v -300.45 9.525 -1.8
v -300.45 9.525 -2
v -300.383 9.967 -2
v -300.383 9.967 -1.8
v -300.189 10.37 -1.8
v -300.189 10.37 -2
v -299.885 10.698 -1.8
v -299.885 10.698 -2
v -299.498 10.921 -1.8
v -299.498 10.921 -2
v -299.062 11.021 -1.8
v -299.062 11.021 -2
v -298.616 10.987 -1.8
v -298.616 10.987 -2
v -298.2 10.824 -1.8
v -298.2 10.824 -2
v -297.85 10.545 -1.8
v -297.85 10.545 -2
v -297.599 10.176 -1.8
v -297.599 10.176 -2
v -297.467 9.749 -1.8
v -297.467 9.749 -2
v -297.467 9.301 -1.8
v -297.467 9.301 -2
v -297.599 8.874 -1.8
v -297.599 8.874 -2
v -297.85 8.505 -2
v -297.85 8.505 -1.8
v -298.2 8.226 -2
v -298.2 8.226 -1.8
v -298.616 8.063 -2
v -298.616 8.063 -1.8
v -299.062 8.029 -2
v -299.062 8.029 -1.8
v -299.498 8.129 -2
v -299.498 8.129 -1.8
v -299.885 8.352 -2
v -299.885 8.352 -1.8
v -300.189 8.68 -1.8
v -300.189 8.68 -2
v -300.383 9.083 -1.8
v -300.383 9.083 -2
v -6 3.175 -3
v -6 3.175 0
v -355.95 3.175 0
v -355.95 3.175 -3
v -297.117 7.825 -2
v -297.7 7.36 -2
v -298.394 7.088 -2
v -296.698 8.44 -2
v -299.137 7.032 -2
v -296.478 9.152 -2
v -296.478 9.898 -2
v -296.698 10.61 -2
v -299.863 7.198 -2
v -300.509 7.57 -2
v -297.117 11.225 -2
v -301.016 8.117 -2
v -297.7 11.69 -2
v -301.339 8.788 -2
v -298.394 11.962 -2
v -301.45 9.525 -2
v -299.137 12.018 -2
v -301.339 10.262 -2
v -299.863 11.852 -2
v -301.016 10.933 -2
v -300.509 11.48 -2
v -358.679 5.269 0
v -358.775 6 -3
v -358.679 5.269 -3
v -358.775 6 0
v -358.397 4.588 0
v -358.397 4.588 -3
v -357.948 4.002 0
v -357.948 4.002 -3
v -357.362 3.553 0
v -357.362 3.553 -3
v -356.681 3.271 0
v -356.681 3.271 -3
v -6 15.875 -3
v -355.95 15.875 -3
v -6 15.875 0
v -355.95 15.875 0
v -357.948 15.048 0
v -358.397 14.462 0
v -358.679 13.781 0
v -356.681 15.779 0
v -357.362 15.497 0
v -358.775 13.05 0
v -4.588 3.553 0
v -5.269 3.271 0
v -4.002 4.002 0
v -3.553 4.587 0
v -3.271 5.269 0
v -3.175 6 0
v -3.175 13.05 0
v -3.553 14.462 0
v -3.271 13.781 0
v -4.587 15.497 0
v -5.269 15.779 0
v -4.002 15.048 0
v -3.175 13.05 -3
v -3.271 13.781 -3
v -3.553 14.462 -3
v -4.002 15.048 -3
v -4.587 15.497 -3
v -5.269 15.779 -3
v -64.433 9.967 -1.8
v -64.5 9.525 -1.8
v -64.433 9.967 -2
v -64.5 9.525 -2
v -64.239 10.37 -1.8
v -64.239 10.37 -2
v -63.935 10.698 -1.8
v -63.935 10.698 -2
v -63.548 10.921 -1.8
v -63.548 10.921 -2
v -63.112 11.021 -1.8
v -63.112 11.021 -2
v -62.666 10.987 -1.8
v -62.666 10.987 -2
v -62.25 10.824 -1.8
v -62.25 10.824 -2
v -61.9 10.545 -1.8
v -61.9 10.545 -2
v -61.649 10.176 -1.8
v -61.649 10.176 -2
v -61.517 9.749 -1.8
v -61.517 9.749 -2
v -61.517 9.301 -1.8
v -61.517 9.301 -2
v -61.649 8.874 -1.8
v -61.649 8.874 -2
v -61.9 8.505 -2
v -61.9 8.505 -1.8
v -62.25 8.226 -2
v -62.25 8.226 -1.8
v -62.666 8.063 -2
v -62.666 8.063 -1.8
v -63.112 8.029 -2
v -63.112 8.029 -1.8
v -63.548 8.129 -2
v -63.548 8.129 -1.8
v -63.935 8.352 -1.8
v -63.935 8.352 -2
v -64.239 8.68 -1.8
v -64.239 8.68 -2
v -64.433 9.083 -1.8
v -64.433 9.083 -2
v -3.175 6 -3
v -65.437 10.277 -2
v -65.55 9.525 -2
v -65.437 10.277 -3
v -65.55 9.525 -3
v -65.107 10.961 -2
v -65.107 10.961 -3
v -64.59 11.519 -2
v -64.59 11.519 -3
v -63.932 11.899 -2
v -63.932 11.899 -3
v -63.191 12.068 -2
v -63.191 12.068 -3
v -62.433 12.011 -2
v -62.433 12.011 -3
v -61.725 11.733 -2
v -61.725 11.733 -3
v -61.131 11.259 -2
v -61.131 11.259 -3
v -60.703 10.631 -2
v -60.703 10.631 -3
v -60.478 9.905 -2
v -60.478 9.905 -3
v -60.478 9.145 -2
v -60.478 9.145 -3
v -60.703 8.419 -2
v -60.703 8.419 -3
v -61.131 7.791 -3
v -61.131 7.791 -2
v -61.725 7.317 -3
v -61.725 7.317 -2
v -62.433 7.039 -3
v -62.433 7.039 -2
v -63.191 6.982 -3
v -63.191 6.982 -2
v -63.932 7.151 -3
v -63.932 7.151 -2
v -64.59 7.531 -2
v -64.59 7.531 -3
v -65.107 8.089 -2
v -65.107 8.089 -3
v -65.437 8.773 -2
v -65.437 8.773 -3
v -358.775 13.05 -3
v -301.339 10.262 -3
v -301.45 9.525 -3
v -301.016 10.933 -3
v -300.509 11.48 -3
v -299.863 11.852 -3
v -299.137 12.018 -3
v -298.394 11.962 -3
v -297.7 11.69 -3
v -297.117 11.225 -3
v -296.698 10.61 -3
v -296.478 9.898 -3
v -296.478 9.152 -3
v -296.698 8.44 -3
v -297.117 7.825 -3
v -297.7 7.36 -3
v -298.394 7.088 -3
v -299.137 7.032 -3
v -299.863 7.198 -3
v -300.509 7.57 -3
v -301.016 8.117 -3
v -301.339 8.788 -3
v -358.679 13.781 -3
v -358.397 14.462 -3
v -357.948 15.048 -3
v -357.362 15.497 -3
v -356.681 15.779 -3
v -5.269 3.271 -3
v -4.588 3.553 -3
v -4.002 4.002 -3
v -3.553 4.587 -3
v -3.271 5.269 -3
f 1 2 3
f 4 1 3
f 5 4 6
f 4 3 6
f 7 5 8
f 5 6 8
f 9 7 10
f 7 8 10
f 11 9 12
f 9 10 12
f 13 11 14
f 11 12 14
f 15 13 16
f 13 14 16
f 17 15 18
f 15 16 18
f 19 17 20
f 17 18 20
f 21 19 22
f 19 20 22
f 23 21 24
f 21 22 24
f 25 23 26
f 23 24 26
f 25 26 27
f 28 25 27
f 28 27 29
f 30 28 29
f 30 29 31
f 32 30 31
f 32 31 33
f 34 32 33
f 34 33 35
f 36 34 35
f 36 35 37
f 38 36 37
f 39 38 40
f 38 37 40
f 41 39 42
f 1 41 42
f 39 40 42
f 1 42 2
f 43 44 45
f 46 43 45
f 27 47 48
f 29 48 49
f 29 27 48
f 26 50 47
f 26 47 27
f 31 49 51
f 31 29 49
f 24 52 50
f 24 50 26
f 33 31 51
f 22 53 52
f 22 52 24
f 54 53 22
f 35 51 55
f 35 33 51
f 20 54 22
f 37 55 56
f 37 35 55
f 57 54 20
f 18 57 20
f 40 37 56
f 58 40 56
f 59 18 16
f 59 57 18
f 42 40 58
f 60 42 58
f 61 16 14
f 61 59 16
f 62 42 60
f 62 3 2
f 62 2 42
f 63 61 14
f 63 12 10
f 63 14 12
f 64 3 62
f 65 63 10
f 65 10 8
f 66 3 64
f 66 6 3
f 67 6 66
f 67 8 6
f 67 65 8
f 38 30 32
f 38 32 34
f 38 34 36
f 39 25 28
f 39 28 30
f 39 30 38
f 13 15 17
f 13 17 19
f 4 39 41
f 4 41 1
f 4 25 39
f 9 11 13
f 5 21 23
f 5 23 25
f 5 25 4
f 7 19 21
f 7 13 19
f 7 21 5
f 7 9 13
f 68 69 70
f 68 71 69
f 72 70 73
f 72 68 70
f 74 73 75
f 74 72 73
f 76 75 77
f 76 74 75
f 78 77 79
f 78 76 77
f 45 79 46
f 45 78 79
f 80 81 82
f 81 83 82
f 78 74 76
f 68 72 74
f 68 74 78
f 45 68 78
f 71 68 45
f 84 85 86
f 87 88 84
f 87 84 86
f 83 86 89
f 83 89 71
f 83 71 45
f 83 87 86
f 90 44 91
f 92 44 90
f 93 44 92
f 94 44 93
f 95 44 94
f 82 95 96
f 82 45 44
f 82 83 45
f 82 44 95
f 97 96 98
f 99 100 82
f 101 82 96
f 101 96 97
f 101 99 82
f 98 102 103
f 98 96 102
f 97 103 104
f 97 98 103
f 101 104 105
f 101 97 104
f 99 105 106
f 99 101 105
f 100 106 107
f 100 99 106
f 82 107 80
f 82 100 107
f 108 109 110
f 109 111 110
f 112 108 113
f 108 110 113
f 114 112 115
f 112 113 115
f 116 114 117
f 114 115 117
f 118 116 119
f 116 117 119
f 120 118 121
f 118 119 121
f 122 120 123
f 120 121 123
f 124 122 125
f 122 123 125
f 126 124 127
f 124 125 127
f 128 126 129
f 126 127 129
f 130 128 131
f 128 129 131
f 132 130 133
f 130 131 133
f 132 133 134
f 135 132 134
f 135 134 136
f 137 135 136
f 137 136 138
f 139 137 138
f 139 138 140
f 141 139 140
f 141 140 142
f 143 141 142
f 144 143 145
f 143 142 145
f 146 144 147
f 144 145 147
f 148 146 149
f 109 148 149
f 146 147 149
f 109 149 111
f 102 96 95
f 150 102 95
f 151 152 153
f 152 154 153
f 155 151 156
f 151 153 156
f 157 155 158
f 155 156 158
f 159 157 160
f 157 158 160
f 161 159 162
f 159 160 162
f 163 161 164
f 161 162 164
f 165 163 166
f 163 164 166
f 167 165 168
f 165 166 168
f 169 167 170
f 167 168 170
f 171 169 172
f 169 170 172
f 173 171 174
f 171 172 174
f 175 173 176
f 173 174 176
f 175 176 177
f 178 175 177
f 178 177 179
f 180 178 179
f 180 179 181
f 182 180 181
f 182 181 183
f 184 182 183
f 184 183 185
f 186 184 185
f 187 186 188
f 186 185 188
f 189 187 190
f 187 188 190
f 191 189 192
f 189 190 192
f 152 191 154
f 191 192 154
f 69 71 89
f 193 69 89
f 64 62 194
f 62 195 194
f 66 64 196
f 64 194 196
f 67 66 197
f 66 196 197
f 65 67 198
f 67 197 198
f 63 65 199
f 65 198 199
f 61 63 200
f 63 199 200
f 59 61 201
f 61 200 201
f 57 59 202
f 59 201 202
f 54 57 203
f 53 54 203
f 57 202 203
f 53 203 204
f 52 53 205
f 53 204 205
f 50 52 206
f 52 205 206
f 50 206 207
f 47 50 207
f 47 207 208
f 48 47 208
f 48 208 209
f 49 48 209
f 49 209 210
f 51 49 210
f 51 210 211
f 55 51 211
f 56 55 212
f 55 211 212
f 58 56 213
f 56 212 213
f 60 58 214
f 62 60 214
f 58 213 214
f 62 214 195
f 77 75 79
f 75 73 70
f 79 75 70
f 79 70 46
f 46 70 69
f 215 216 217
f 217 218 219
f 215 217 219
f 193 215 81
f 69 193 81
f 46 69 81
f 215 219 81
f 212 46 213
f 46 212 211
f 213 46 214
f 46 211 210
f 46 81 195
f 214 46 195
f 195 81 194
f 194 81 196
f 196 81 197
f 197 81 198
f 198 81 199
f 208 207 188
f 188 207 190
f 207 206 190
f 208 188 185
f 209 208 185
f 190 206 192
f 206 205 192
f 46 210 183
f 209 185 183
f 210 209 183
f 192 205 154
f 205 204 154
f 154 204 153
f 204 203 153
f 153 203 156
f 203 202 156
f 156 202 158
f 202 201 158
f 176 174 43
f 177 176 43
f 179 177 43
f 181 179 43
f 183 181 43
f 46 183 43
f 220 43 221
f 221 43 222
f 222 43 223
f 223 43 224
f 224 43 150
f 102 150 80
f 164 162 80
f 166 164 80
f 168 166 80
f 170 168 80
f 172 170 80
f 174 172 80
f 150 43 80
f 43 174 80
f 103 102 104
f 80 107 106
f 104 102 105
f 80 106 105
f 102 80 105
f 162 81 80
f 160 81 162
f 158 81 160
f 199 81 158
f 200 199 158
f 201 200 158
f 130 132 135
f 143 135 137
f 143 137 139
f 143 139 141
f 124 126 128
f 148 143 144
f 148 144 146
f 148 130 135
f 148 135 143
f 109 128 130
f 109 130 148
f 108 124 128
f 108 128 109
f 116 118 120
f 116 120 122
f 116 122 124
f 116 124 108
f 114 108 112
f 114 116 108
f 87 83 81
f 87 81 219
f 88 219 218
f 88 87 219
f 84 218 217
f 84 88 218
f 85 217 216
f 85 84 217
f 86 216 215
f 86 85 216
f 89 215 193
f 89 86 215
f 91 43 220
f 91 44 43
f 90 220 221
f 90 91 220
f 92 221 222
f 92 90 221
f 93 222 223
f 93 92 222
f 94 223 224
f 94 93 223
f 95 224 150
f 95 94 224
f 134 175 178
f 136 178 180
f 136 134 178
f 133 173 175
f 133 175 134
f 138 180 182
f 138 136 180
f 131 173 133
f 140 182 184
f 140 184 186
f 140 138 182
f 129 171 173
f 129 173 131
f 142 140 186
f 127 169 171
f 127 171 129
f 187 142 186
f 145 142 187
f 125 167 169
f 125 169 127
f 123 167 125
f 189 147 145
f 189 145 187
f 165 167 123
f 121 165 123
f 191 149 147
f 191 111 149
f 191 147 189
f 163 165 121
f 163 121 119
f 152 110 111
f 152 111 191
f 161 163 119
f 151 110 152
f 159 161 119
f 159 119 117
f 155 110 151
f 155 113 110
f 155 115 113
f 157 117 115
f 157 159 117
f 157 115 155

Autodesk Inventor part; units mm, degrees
ref_plane "YZ Plane" through (0, 0, 0) normal (1, 0, 0) x (0, 1, 0)
ref_plane "XZ Plane" through (0, 0, 0) normal (0, 1, 0) x (-1, 0, 0)
ref_plane "XY Plane" through (0, 0, 0) normal (0, 0, 1) x (1, 0, 0)
sketch "Sketch1" plane through (0, 0, 0) normal (0, 0, 1) x (1, 0, 0)
  line L0 (-381.35, 16.05) -> (-6, 16.05)
  line L1 (-3, 13.05) -> (-3, 6)
  line L2 (-6, 3) -> (-381.35, 3)
  line L3 (-384.35, 6) -> (-384.35, 13.05)
  arc A0 (-3, 13.05) -> (-6, 16.05) centre (-6, 13.05) ccw
  arc A1 (-6, 3) -> (-3, 6) centre (-6, 6) ccw
  arc A2 (-381.35, 16.05) -> (-384.35, 13.05) centre (-381.35, 13.05) ccw
  arc A3 (-384.35, 6) -> (-381.35, 3) centre (-381.35, 6) ccw
  line L4 (-41.8897, 11.0236) -> (-317.4797, 11.0236)
  line L5 (-317.4797, 7.9756) -> (-41.8897, 7.9756)
  line L6 (-368.2797, 11.0236) -> (-368.2797, 7.9756)
  arc A4 (-368.2797, 11.0236) -> (-368.2797, 7.9756) centre (-368.2797, 9.4996) ccw
  line L7 (-86.8832, 11.0236) -> (-99.5832, 11.0236)
  line L8 (-41.8897, 11.0236) -> (-41.8897, 7.9756)
  arc A5 (-41.8897, 7.9756) -> (-41.8897, 11.0236) centre (-41.8897, 9.4996) ccw
  line L9 (-36.3424, 11.0744) -> (-6.7422, 11.0744) construction
  line L10 (-6.7422, 11.0744) -> (-6.7422, 8.0311) construction
  line L11 (-6.7422, 8.0311) -> (-36.3424, 8.0311) construction
  line L12 (-36.3424, 8.0311) -> (-36.3424, 11.0744) construction
  line L13 (-317.4797, 11.0236) -> (-368.2797, 11.0236)
  line L14 (-317.4797, 7.9756) -> (-368.2797, 7.9756)
  line L15 (-193.675, 9.525) -> (-193.675, 10.1012)
  line L16 (-193.675, 9.525) -> (-193.6526, 8.8818)
  line L17 (-35.1521, 9.2905) -> (-35.4935, 8.9245)
  line L18 (-35.4935, 8.9245) -> (-35.4935, 7.9833)
  line L19 (-35.4935, 7.9833) -> (-36.0379, 7.9833)
  line L20 (-36.0379, 7.9833) -> (-36.0379, 11.0313)
  line L21 (-36.0379, 11.0313) -> (-35.4935, 11.0313)
  line L22 (-35.4935, 11.0313) -> (-35.4935, 9.6073)
  line L23 (-35.4935, 9.6073) -> (-35.2013, 9.9733)
  line L24 (-35.2013, 9.9733) -> (-34.3278, 11.0313)
  line L25 (-34.3278, 11.0313) -> (-33.6665, 11.0313)
  line L26 (-33.6665, 11.0313) -> (-34.7922, 9.6842)
  line L27 (-34.7922, 9.6842) -> (-33.6081, 7.9833)
  line L28 (-33.6081, 7.9833) -> (-34.254, 7.9833)
  line L29 (-34.254, 7.9833) -> (-35.1521, 9.2905)
  spline S0 degree 2 poles (-31.6581, 9.5704) (-31.4028, 9.5027) (-31.1445, 9.1244) (-31.1445, 8.8753) knots 0 0 0 1 2 2 2
  spline S1 degree 2 poles (-31.1445, 8.8753) (-31.1445, 8.4416) (-31.7012, 7.9833) (-32.2056, 7.9833) knots 0 0 0 1 2 2 2
  line L30 (-32.2056, 7.9833) -> (-33.1252, 7.9833)
  line L31 (-33.1252, 7.9833) -> (-33.3313, 7.9833)
  line L32 (-33.3313, 7.9833) -> (-33.3313, 11.0313)
  line L33 (-33.3313, 11.0313) -> (-32.2825, 11.0313)
  spline S2 degree 2 poles (-32.2825, 11.0313) (-31.7688, 11.0313) (-31.2152, 10.6223) (-31.2152, 10.2071) knots 0 0 0 1 2 2 2
  spline S3 degree 2 poles (-31.2152, 10.2071) (-31.2152, 9.9918) (-31.4428, 9.6596) (-31.6581, 9.5704) knots 0 0 0 1 2 2 2
  spline S4 degree 2 poles (-32.2056, 8.4201) (-31.9534, 8.4201) (-31.6858, 8.6692) (-31.6858, 8.8753) knots 0 0 0 1 2 2 2
  spline S5 degree 2 poles (-31.6858, 8.8753) (-31.6858, 9.352) (-32.184, 9.352) knots 0 0 0 1 1 1
  line L34 (-32.184, 9.352) -> (-32.7869, 9.352)
  line L35 (-32.7869, 9.352) -> (-32.7869, 8.4201)
  line L36 (-32.7869, 8.4201) -> (-32.2056, 8.4201)
  line L37 (-32.7869, 10.5946) -> (-32.7869, 9.7488)
  line L38 (-32.7869, 9.7488) -> (-32.2794, 9.7488)
  spline S6 degree 2 poles (-32.2794, 9.7488) (-32.0303, 9.7488) (-31.7565, 9.9733) (-31.7565, 10.1732) knots 0 0 0 1 2 2 2
  spline S7 degree 2 poles (-31.7565, 10.1732) (-31.7565, 10.3947) (-32.0118, 10.5946) (-32.2825, 10.5946) knots 0 0 0 1 2 2 2
  line L39 (-32.2825, 10.5946) -> (-32.7869, 10.5946)
  spline S8 degree 2 poles (-29.7143, 11.0313) (-29.3083, 11.0313) (-28.6839, 10.6715) (-28.3364, 10.0133) (-28.3364, 9.5796) knots 0 0 0 1 2 3 3 3
  line L40 (-28.3364, 9.5796) -> (-28.3364, 9.432)
  spline S9 degree 2 poles (-28.3364, 9.432) (-28.3364, 8.9952) (-28.6839, 8.3401) (-29.3144, 7.9833) (-29.7327, 7.9833) knots 0 0 0 1 2 3 3 3
  line L41 (-29.7327, 7.9833) -> (-30.3786, 7.9833)
  line L42 (-30.3786, 7.9833) -> (-30.6185, 7.9833)
  line L43 (-30.6185, 7.9833) -> (-30.6185, 11.0313)
  line L44 (-30.6185, 11.0313) -> (-30.0741, 11.0313)
  line L45 (-30.0741, 11.0313) -> (-29.7143, 11.0313)
  spline S10 degree 2 poles (-28.8808, 9.5858) (-28.8808, 10.0748) (-29.3083, 10.5946) (-29.7143, 10.5946) knots 0 0 0 1 2 2 2
  line L46 (-29.7143, 10.5946) -> (-30.0741, 10.5946)
  line L47 (-30.0741, 10.5946) -> (-30.0741, 8.4201)
  line L48 (-30.0741, 8.4201) -> (-29.7327, 8.4201)
  spline S11 degree 2 poles (-29.7327, 8.4201) (-29.3144, 8.4201) (-28.8808, 8.9491) (-28.8808, 9.432) knots 0 0 0 1 2 2 2
  line L49 (-28.8808, 9.432) -> (-28.8808, 9.5858)
  line L50 (-26.8293, 7.9833) -> (-26.8293, 8.3432)
  line L51 (-26.8293, 8.3432) -> (-25.8389, 9.4197)
  spline S12 degree 2 poles (-25.8389, 9.4197) (-25.6759, 9.6011) (-25.4914, 9.8626) (-25.4145, 10.0717) (-25.4145, 10.1763) knots 0 0 0 1 2 3 3 3
  spline S13 degree 2 poles (-25.4145, 10.1763) (-25.4145, 10.3916) (-25.6513, 10.6561) (-25.8604, 10.6561) knots 0 0 0 1 2 2 2
  spline S14 degree 2 poles (-25.8604, 10.6561) (-26.1065, 10.6561) (-26.3679, 10.3516) (-26.3679, 10.0994) knots 0 0 0 1 2 2 2
  line L52 (-26.3679, 10.0994) -> (-26.8908, 10.0994)
  spline S15 degree 2 poles (-26.8908, 10.0994) (-26.8908, 10.3701) (-26.6417, 10.813) (-26.1742, 11.0744) (-25.8543, 11.0744) knots 0 0 0 1 2 3 3 3
  spline S16 degree 2 poles (-25.8543, 11.0744) (-25.5498, 11.0744) (-25.1192, 10.8683) (-24.8916, 10.49) (-24.8916, 10.2317) knots 0 0 0 1 2 3 3 3
  spline S17 degree 2 poles (-24.8916, 10.2317) (-24.8916, 9.9641) (-25.2115, 9.4289) (-25.516, 9.109) knots 0 0 0 1 2 2 2
  line L53 (-25.516, 9.109) -> (-26.1772, 8.4016)
  line L54 (-26.1772, 8.4016) -> (-24.7747, 8.4016)
  line L55 (-24.7747, 8.4016) -> (-24.7747, 7.9833)
  line L56 (-24.7747, 7.9833) -> (-26.8293, 7.9833)
  spline S18 degree 2 poles (-23.2184, 10.0071) (-22.9324, 10.0071) (-22.5387, 9.7242) (-22.348, 9.2597) (-22.348, 8.9829) knots 0 0 0 1 2 3 3 3
  spline S19 degree 2 poles (-22.348, 8.9829) (-22.348, 8.6877) (-22.5848, 8.214) (-23.037, 7.9403) (-23.3415, 7.9403) knots 0 0 0 1 2 3 3 3
  spline S20 degree 2 poles (-23.3415, 7.9403) (-23.6613, 7.9403) (-24.1288, 8.2663) (-24.3749, 8.8138) (-24.3749, 9.1398) knots 0 0 0 1 2 3 3 3
  line L57 (-24.3749, 9.1398) -> (-24.3749, 9.3428)
  spline S21 degree 2 poles (-24.3749, 9.3428) (-24.3749, 9.8226) (-24.0612, 10.5915) (-23.3814, 11.0498) (-22.8617, 11.0498) knots 0 0 0 1 2 3 3 3
  line L58 (-22.8617, 11.0498) -> (-22.7971, 11.0498)
  line L59 (-22.7971, 11.0498) -> (-22.7971, 10.6192)
  line L60 (-22.7971, 10.6192) -> (-22.834, 10.6192)
  spline S22 degree 2 poles (-22.834, 10.6192) (-23.1477, 10.6192) (-23.5783, 10.3916) (-23.812, 10.0071) (-23.8397, 9.7519) knots 0 0 0 1 2 3 3 3
  spline S23 degree 2 poles (-23.8397, 9.7519) (-23.7259, 9.8749) (-23.4061, 10.0071) (-23.2184, 10.0071) knots 0 0 0 1 2 2 2
  spline S24 degree 2 poles (-23.3476, 8.3616) (-23.2, 8.3616) (-22.9816, 8.5185) (-22.8647, 8.7922) (-22.8647, 8.9706) knots 0 0 0 1 2 3 3 3
  spline S25 degree 2 poles (-22.8647, 8.9706) (-22.8647, 9.1429) (-22.9785, 9.4228) (-23.1969, 9.5858) (-23.3507, 9.5858) knots 0 0 0 1 2 3 3 3
  spline S26 degree 2 poles (-23.3507, 9.5858) (-23.5199, 9.5858) (-23.7905, 9.3951) (-23.852, 9.2505) knots 0 0 0 1 2 2 2
  line L61 (-23.852, 9.2505) -> (-23.852, 9.0906)
  spline S27 degree 2 poles (-23.852, 9.0906) (-23.852, 8.8599) (-23.7167, 8.5308) (-23.4891, 8.3616) (-23.3476, 8.3616) knots 0 0 0 1 2 3 3 3
  spline S28 degree 2 poles (-19.9521, 9.2659) (-19.9521, 7.9403) (-20.9486, 7.9403) knots 0 0 0 1 1 1
  spline S29 degree 2 poles (-20.9486, 7.9403) (-21.4253, 7.9403) (-21.9543, 8.5739) (-21.9543, 9.2659) knots 0 0 0 1 2 2 2
  line L62 (-21.9543, 9.2659) -> (-21.9543, 9.7642)
  spline S30 degree 2 poles (-21.9543, 9.7642) (-21.9543, 10.4531) (-21.4315, 11.0744) (-20.9547, 11.0744) knots 0 0 0 1 2 2 2
  spline S31 degree 2 poles (-20.9547, 11.0744) (-20.478, 11.0744) (-19.9521, 10.4531) (-19.9521, 9.7642) knots 0 0 0 1 2 2 2
  line L63 (-19.9521, 9.7642) -> (-19.9521, 9.2659)
  spline S32 degree 2 poles (-20.4719, 9.8411) (-20.4719, 10.2809) (-20.7118, 10.6561) (-20.9547, 10.6561) knots 0 0 0 1 2 2 2
  spline S33 degree 2 poles (-20.9547, 10.6561) (-21.1916, 10.6561) (-21.4345, 10.2809) (-21.4345, 9.8411) knots 0 0 0 1 2 2 2
  line L64 (-21.4345, 9.8411) -> (-21.4345, 9.1921)
  spline S34 degree 2 poles (-21.4345, 9.1921) (-21.4345, 8.7523) (-21.1885, 8.3616) (-20.9486, 8.3616) knots 0 0 0 1 2 2 2
  spline S35 degree 2 poles (-20.9486, 8.3616) (-20.7087, 8.3616) (-20.4719, 8.7461) (-20.4719, 9.1921) knots 0 0 0 1 2 2 2
  line L65 (-20.4719, 9.1921) -> (-20.4719, 9.8411)
  spline S36 degree 2 poles (-17.51, 9.2659) (-17.51, 7.9403) (-18.5065, 7.9403) knots 0 0 0 1 1 1
  spline S37 degree 2 poles (-18.5065, 7.9403) (-18.9832, 7.9403) (-19.5122, 8.5739) (-19.5122, 9.2659) knots 0 0 0 1 2 2 2
  line L66 (-19.5122, 9.2659) -> (-19.5122, 9.7642)
  spline S38 degree 2 poles (-19.5122, 9.7642) (-19.5122, 10.4531) (-18.9894, 11.0744) (-18.5126, 11.0744) knots 0 0 0 1 2 2 2
  spline S39 degree 2 poles (-18.5126, 11.0744) (-18.0359, 11.0744) (-17.51, 10.4531) (-17.51, 9.7642) knots 0 0 0 1 2 2 2
  line L67 (-17.51, 9.7642) -> (-17.51, 9.2659)
  spline S40 degree 2 poles (-18.0298, 9.8411) (-18.0298, 10.2809) (-18.2697, 10.6561) (-18.5126, 10.6561) knots 0 0 0 1 2 2 2
  spline S41 degree 2 poles (-18.5126, 10.6561) (-18.7495, 10.6561) (-18.9925, 10.2809) (-18.9925, 9.8411) knots 0 0 0 1 2 2 2
  line L68 (-18.9925, 9.8411) -> (-18.9925, 9.1921)
  spline S42 degree 2 poles (-18.9925, 9.1921) (-18.9925, 8.7523) (-18.7464, 8.3616) (-18.5065, 8.3616) knots 0 0 0 1 2 2 2
  spline S43 degree 2 poles (-18.5065, 8.3616) (-18.2666, 8.3616) (-18.0298, 8.7461) (-18.0298, 9.1921) knots 0 0 0 1 2 2 2
  line L69 (-18.0298, 9.1921) -> (-18.0298, 9.8411)
  point P0 (0, 0)
  point P1 (0, 0)
  point P2 (0, 0)
  point P3 (-31.75, 11.049)
  point P4 (-31.75, 8.001)
  point P5 (19.05, 8.001)
  point P6 (19.05, 11.049)
  dimension "d0" = 3
extrude "Extrusion1" add sketch "Sketch1" against normal blind 3 contours L0 A0 L1 A1 L2 A3 L3 A2 | L8 L5 L14 L6 L13 L4 | A5 L8 | A4 L6 | L17 L18 L19 L20 L21 L22 L23 L24 L25 L26 L27 L28 L29 | S0 S1 L30 L31 L32 L33 S2 S3 | L36 L35 L34 S5 S4 | L39 S7 S6 L38 L37 | S8 L40 S9 L41 L42 L43 L44 L45 | L49 S11 L48 L47 L46 S10 | L50 L51 S12 S13 S14 L52 S15 S16 S17 L53 L54 L55 L56 | S18 S19 S20 L57 S21 L58 L59 L60 S22 S23 | S27 L61 S26 S25 S24 | S28 S29 L62 S30 S31 L63 | L65 S35 S34 L64 S33 S32 | S36 S37 L66 S38 S39 L67 | L69 S43 S42 L68 S41 S40
extrude "Extrusion2" cut sketch "Sketch1" against normal blind 0.1 contours L8 L5 L14 L6 L13 L4 | A5 L8 | A4 L6 | L17 L18 L19 L20 L21 L22 L23 L24 L25 L26 L27 L28 L29 | S0 S1 L30 L31 L32 L33 S2 S3 | S8 L40 S9 L41 L42 L43 L44 L45 | L50 L51 S12 S13 S14 L52 S15 S16 S17 L53 L54 L55 L56 | S18 S19 S20 L57 S21 L58 L59 L60 S22 S23 | S28 S29 L62 S30 S31 L63 | S36 S37 L66 S38 S39 L67
sketch "Sketch2" plane through (0, 0, 0) normal (0, 0, 1) x (1, 0, 0)
  line L0 (-6, 16.05) -> (-381.35, 16.05) projected
  line L1 (-3, 3) -> (-355.95, 3)
  line L2 (-358.95, 6) -> (-358.95, 13.05)
  line L3 (-355.95, 16.05) -> (-3, 16.05)
  line L4 (-3, 16.05) -> (-3, 3)
  arc A0 (-355.95, 16.05) -> (-358.95, 13.05) centre (-355.95, 13.05) ccw
  arc A1 (-358.95, 6) -> (-355.95, 3) centre (-355.95, 6) ccw
  line L5 (-355.95, 16.05) -> (-339.88, 16.05)
  line L6 (-339.88, 7.9756) -> (-355.95, 7.9756)
  arc A2 (-339.88, 11.0236) -> (-339.88, 7.9756) centre (-339.88, 9.4996) ccw
  line L7 (-358.95, 11.0236) -> (-339.88, 11.0236)
  line L8 (-339.88, 11.0236) -> (-339.88, 7.9756)
  line L9 (-339.88, 7.9756) -> (-358.95, 7.9756)
  line L10 (-358.95, 7.9756) -> (-358.95, 11.0236)
  line L11 (-355.95, 16.05) -> (-390.1451, 16.05)
  line L12 (-390.1451, 16.05) -> (-390.1451, 0)
  line L13 (-390.1451, 0) -> (-355.95, 0)
  line L14 (-355.95, 0) -> (-355.95, 3)
  point P0 (0, 0)
  point P1 (-358.95, 16.05)
extrude "Extrusion3" cut sketch "Sketch2" against normal blind 10 contours A0 L2 A1 L14 L13 L12 L11 L0
extrude "Extrusion4" add sketch "Sketch2" against normal up to surface (0.1 mm away) contours L7 A2 L6 L9 L2
sketch "Sketch3" plane through (0, 0, -3) normal (0, 0, -1) x (-1, 0, 0)
  line L0 (3, 16.05) -> (358.95, 16.05)
  line L1 (358.95, 16.05) -> (358.95, 3)
  line L2 (358.95, 3) -> (3, 3)
  line L3 (3, 3) -> (3, 16.05)
  line L4 (355.95, 3) -> (6, 3) projected
  line L5 (3, 16.05) -> (33, 16.05)
  line L6 (33, 16.05) -> (33, 3)
  line L7 (33, 3) -> (3, 3)
  line L8 (3, 3) -> (3, 16.05)
  line L9 (358.95, 16.05) -> (328.95, 16.05)
  line L10 (328.95, 16.05) -> (328.95, 3)
  line L11 (328.95, 3) -> (358.95, 3)
  line L12 (358.95, 3) -> (358.95, 16.05)
  line L13 (33, 16.05) -> (33, 9.525)
  line L14 (33, 9.525) -> (328.95, 9.525)
  line L15 (33, 9.525) -> (63, 9.525)
  line L16 (328.95, 9.525) -> (298.95, 9.525)
  circle A0 centre (63, 9.525) radius 2.5
  circle A1 centre (298.95, 9.525) radius 2.5
  line L17 (65.5, 9.525) -> (70.5, 9.525)
  point P0 (0, 0)
  dimension "d20" = 30
  dimension "d21" = 30
  dimension "d22" = 6.525
  dimension "d23" = 30
  dimension "d24" = 30
  dimension "d26" = 5
  dimension "d27" = 5
extrude "Extrusion5" cut sketch "Sketch3" against normal blind 1 contours A0 L14 | L14 A0 | A1 L14 | L14 A1
sketch "Sketch4" plane through (-298.95, 9.525, -2) normal (0, 0, -1) x (-1, 0, 0)
  circle A0 centre (-235.95, 0) radius 2.5 projected
  circle A1 centre (-235.95, 0) radius 2.5
  circle A2 centre (-235.95, 0) radius 1.5
  circle A3 centre (0, 0) radius 2.5
  circle A4 centre (0, 0) radius 1.5
  point P0 (-298.95, -9.525)
  dimension "d30" = 1
  dimension "d31" = 1
extrude "Extrusion6" cut sketch "Sketch4" against normal blind 0.2 contours A2 | A4
sketch "Sketch5" plane through (0, 0, 0) normal (0, 0, 1) x (1, 0, 0)
  line L0 (-358.95, 13.05) -> (-358.95, 6) projected
  arc A0 (-358.95, 6) -> (-355.95, 3) centre (-355.95, 6) ccw projected
  line L1 (-355.95, 3) -> (-6, 3) projected
  arc A1 (-6, 3) -> (-3, 6) centre (-6, 6) ccw projected
  line L2 (-3, 6) -> (-3, 13.05) projected
  arc A2 (-3, 13.05) -> (-6, 16.05) centre (-6, 13.05) ccw projected
  line L3 (-6, 16.05) -> (-355.95, 16.05) projected
  arc A3 (-355.95, 16.05) -> (-358.95, 13.05) centre (-355.95, 13.05) ccw projected
  line L4 (-355.95, 16.075) -> (-6, 16.075)
  arc A4 (-2.975, 13.05) -> (-6, 16.075) centre (-6, 13.05) ccw
  line L5 (-2.975, 13.05) -> (-2.975, 6)
  arc A5 (-6, 2.975) -> (-2.975, 6) centre (-6, 6) ccw
  line L6 (-6, 2.975) -> (-355.95, 2.975)
  arc A6 (-358.975, 6) -> (-355.95, 2.975) centre (-355.95, 6) ccw
  line L7 (-358.975, 6) -> (-358.975, 13.05)
  arc A7 (-355.95, 16.075) -> (-358.975, 13.05) centre (-355.95, 13.05) ccw
  point P0 (0, 0)
  dimension "d34" = 0.025
extrude "Extrusion7" add sketch "Sketch5" against normal up to surface (3 mm away)
sketch "Sketch6" plane through (0, 0, 0) normal (0, 0, 1) x (1, 0, 0)
  arc A0 (-6, 2.975) -> (-2.975, 6) centre (-6, 6) ccw projected
  line L0 (-2.975, 6) -> (-2.975, 13.05) projected
  arc A1 (-2.975, 13.05) -> (-6, 16.075) centre (-6, 13.05) ccw projected
  line L1 (-6, 16.075) -> (-355.95, 16.075) projected
  arc A2 (-355.95, 16.075) -> (-358.975, 13.05) centre (-355.95, 13.05) ccw projected
  line L2 (-358.975, 13.05) -> (-358.975, 6) projected
  arc A3 (-358.975, 6) -> (-355.95, 2.975) centre (-355.95, 6) ccw projected
  line L3 (-355.95, 2.975) -> (-6, 2.975) projected
  line L4 (-355.95, 15.875) -> (-6, 15.875)
  arc A4 (-3.175, 13.05) -> (-6, 15.875) centre (-6, 13.05) ccw
  line L5 (-3.175, 13.05) -> (-3.175, 6)
  arc A5 (-6, 3.175) -> (-3.175, 6) centre (-6, 6) ccw
  line L6 (-6, 3.175) -> (-355.95, 3.175)
  arc A6 (-358.775, 6) -> (-355.95, 3.175) centre (-355.95, 6) ccw
  line L7 (-358.775, 6) -> (-358.775, 13.05)
  arc A7 (-355.95, 15.875) -> (-358.775, 13.05) centre (-355.95, 13.05) ccw
  point P0 (0, 0)
  dimension "d37" = 0.2
extrude "Extrusion8" cut sketch "Sketch6" against normal blind 10
sketch "Sketch7" plane through (0, 0, 0) normal (0, 0, 1) x (1, 0, 0)
  line L0 (-18.0298, 9.1921) -> (-18.0298, 9.8411) projected
  line L1 (-18.9925, 9.8411) -> (-18.9925, 9.1921) projected
  line L2 (-17.51, 9.7642) -> (-17.51, 9.2659) projected
  line L3 (-19.5122, 9.2659) -> (-19.5122, 9.7642) projected
  line L4 (-20.4719, 9.1921) -> (-20.4719, 9.8411) projected
  line L5 (-21.4345, 9.8411) -> (-21.4345, 9.1921) projected
  line L6 (-19.9521, 9.7642) -> (-19.9521, 9.2659) projected
  line L7 (-21.9543, 9.2659) -> (-21.9543, 9.7642) projected
  line L8 (-23.852, 9.2505) -> (-23.852, 9.0906) projected
  line L9 (-22.7971, 10.6192) -> (-22.834, 10.6192) projected
  line L10 (-22.7971, 11.0498) -> (-22.7971, 10.6192) projected
  line L11 (-22.8617, 11.0498) -> (-22.7971, 11.0498) projected
  line L12 (-24.3749, 9.1398) -> (-24.3749, 9.3428) projected
  line L13 (-26.8293, 7.9833) -> (-26.8293, 8.3432) projected
  line L14 (-24.7747, 7.9833) -> (-26.8293, 7.9833) projected
  line L15 (-24.7747, 8.4016) -> (-24.7747, 7.9833) projected
  line L16 (-26.1772, 8.4016) -> (-24.7747, 8.4016) projected
  line L17 (-25.516, 9.109) -> (-26.1772, 8.4016) projected
  line L18 (-26.3679, 10.0994) -> (-26.8908, 10.0994) projected
  line L19 (-26.8293, 8.3432) -> (-25.8389, 9.4197) projected
  line L20 (-29.7143, 10.5946) -> (-30.0741, 10.5946) projected
  line L21 (-28.8808, 9.432) -> (-28.8808, 9.5858) projected
  line L22 (-30.0741, 8.4201) -> (-29.7327, 8.4201) projected
  line L23 (-30.0741, 10.5946) -> (-30.0741, 8.4201) projected
  line L24 (-30.6185, 11.0313) -> (-29.7143, 11.0313) projected
  line L25 (-30.6185, 7.9833) -> (-30.6185, 11.0313) projected
  line L26 (-29.7327, 7.9833) -> (-30.6185, 7.9833) projected
  line L27 (-28.3364, 9.5796) -> (-28.3364, 9.432) projected
  line L28 (-32.7869, 9.7488) -> (-32.2794, 9.7488) projected
  line L29 (-32.7869, 10.5946) -> (-32.7869, 9.7488) projected
  line L30 (-32.2825, 10.5946) -> (-32.7869, 10.5946) projected
  line L31 (-32.7869, 8.4201) -> (-32.2056, 8.4201) projected
  line L32 (-32.7869, 9.352) -> (-32.7869, 8.4201) projected
  line L33 (-32.184, 9.352) -> (-32.7869, 9.352) projected
  line L34 (-33.3313, 11.0313) -> (-32.2825, 11.0313) projected
  line L35 (-33.3313, 7.9833) -> (-33.3313, 11.0313) projected
  line L36 (-32.2056, 7.9833) -> (-33.3313, 7.9833) projected
  line L37 (-35.1521, 9.2905) -> (-35.4935, 8.9245) projected
  line L38 (-34.254, 7.9833) -> (-35.1521, 9.2905) projected
  line L39 (-33.6081, 7.9833) -> (-34.254, 7.9833) projected
  line L40 (-34.7922, 9.6842) -> (-33.6081, 7.9833) projected
  line L41 (-33.6665, 11.0313) -> (-34.7922, 9.6842) projected
  line L42 (-34.3278, 11.0313) -> (-33.6665, 11.0313) projected
  line L43 (-35.2013, 9.9733) -> (-34.3278, 11.0313) projected
  line L44 (-35.4935, 9.6073) -> (-35.2013, 9.9733) projected
  line L45 (-35.4935, 11.0313) -> (-35.4935, 9.6073) projected
  line L46 (-36.0379, 11.0313) -> (-35.4935, 11.0313) projected
  line L47 (-36.0379, 7.9833) -> (-36.0379, 11.0313) projected
  line L48 (-35.4935, 7.9833) -> (-36.0379, 7.9833) projected
  line L49 (-35.4935, 8.9245) -> (-35.4935, 7.9833) projected
  arc A0 (-339.88, 11.0236) -> (-339.88, 7.9756) centre (-339.88, 9.4996) ccw projected
  line L50 (-41.8897, 7.9756) -> (-339.88, 7.9756) projected
  arc A1 (-41.8897, 7.9756) -> (-41.8897, 11.0236) centre (-41.8897, 9.4996) ccw projected
  line L51 (-339.88, 11.0236) -> (-41.8897, 11.0236) projected
  arc A2 (-358.775, 6) -> (-355.95, 3.175) centre (-355.95, 6) ccw projected
  line L52 (-355.95, 3.175) -> (-6, 3.175) projected
  arc A3 (-6, 3.175) -> (-3.175, 6) centre (-6, 6) ccw projected
  line L53 (-3.175, 6) -> (-3.175, 13.05) projected
  arc A4 (-3.175, 13.05) -> (-6, 15.875) centre (-6, 13.05) ccw projected
  line L54 (-6, 15.875) -> (-355.95, 15.875) projected
  arc A5 (-355.95, 15.875) -> (-358.775, 13.05) centre (-355.95, 13.05) ccw projected
  line L55 (-358.775, 13.05) -> (-358.775, 6) projected
  line L56 (-24.7747, 7.9833) -> (-26.8293, 7.9833) projected
  line L57 (-26.8293, 7.9833) -> (-26.8293, 8.3432) projected
  line L58 (-26.8293, 8.3432) -> (-25.8389, 9.4197) projected
  line L59 (-26.3679, 10.0994) -> (-26.8908, 10.0994) projected
  line L60 (-25.516, 9.109) -> (-26.1772, 8.4016) projected
  line L61 (-26.1772, 8.4016) -> (-24.7747, 8.4016) projected
  line L62 (-24.7747, 8.4016) -> (-24.7747, 7.9833) projected
  line L63 (-30.6185, 11.0313) -> (-29.7143, 11.0313) projected
  line L64 (-28.3364, 9.5796) -> (-28.3364, 9.432) projected
  line L65 (-29.7327, 7.9833) -> (-30.6185, 7.9833) projected
  line L66 (-30.6185, 7.9833) -> (-30.6185, 11.0313) projected
  line L67 (-34.254, 7.9833) -> (-35.1521, 9.2905) projected
  line L68 (-35.1521, 9.2905) -> (-35.4935, 8.9245) projected
  line L69 (-35.4935, 8.9245) -> (-35.4935, 7.9833) projected
  line L70 (-35.4935, 7.9833) -> (-36.0379, 7.9833) projected
  line L71 (-36.0379, 7.9833) -> (-36.0379, 11.0313) projected
  line L72 (-36.0379, 11.0313) -> (-35.4935, 11.0313) projected
  line L73 (-35.4935, 11.0313) -> (-35.4935, 9.6073) projected
  line L74 (-35.4935, 9.6073) -> (-35.2013, 9.9733) projected
  line L75 (-35.2013, 9.9733) -> (-34.3278, 11.0313) projected
  line L76 (-34.3278, 11.0313) -> (-33.6665, 11.0313) projected
  line L77 (-33.6665, 11.0313) -> (-34.7922, 9.6842) projected
  line L78 (-34.7922, 9.6842) -> (-33.6081, 7.9833) projected
  line L79 (-33.6081, 7.9833) -> (-34.254, 7.9833) projected
  arc A6 (-339.88, 11.0236) -> (-339.88, 7.9756) centre (-339.88, 9.4996) ccw projected
  line L80 (-339.88, 11.0236) -> (-41.8897, 11.0236) projected
  arc A7 (-41.8897, 7.9756) -> (-41.8897, 11.0236) centre (-41.8897, 9.4996) ccw projected
  line L81 (-41.8897, 7.9756) -> (-339.88, 7.9756) projected
  line L82 (-32.2056, 7.9833) -> (-33.3313, 7.9833) projected
  line L83 (-33.3313, 7.9833) -> (-33.3313, 11.0313) projected
  line L84 (-33.3313, 11.0313) -> (-32.2825, 11.0313) projected
  line L85 (-24.3749, 9.1398) -> (-24.3749, 9.3428) projected
  line L86 (-22.8617, 11.0498) -> (-22.7971, 11.0498) projected
  line L87 (-22.7971, 11.0498) -> (-22.7971, 10.6192) projected
  line L88 (-22.7971, 10.6192) -> (-22.834, 10.6192) projected
  line L89 (-19.9521, 9.7642) -> (-19.9521, 9.2659) projected
  line L90 (-21.9543, 9.2659) -> (-21.9543, 9.7642) projected
  line L91 (-17.51, 9.7642) -> (-17.51, 9.2659) projected
  line L92 (-19.5122, 9.2659) -> (-19.5122, 9.7642) projected
  point P0 (0, 0)
  point P1 (-18.5126, 10.6561)
  point P2 (-18.5065, 8.3616)
  point P3 (-18.5065, 7.9403)
  point P4 (-18.5126, 11.0744)
  point P5 (-20.9547, 10.6561)
  point P6 (-20.9486, 8.3616)
  point P7 (-20.9486, 7.9403)
  point P8 (-20.9547, 11.0744)
  point P9 (-23.3507, 9.5858)
  point P10 (-22.8647, 8.9706)
  point P11 (-23.3476, 8.3616)
  point P12 (-22.348, 8.9829)
  point P13 (-23.2184, 10.0071)
  point P14 (-23.8397, 9.7519)
  point P15 (-23.3415, 7.9403)
  point P16 (-24.8916, 10.2317)
  point P17 (-25.8543, 11.0744)
  point P18 (-25.8604, 10.6561)
  point P19 (-25.4145, 10.1763)
  point P20 (-31.7565, 10.1732)
  point P21 (-31.6858, 8.8753)
  point P22 (-31.1445, 8.8753)
  point P23 (-31.6581, 9.5704)
  point P24 (-31.2152, 10.2071)
  point P25 (-25.4145, 10.1763)
  point P26 (-25.8604, 10.6561)
  point P27 (-25.8543, 11.0744)
  point P28 (-24.8916, 10.2317)
  point P29 (-31.2152, 10.2071)
  point P30 (-31.6581, 9.5704)
  point P31 (-31.1445, 8.8753)
  point P32 (-23.8397, 9.7519)
  point P33 (-23.2184, 10.0071)
  point P34 (-22.348, 8.9829)
  point P35 (-23.3415, 7.9403)
  point P36 (-20.9486, 7.9403)
  point P37 (-20.9547, 11.0744)
  point P38 (-18.5065, 7.9403)
  point P39 (-18.5126, 11.0744)
sketch "Sketch8" plane through (0, 0, 0) normal (0, 0, 1) x (1, 0, 0)
  line L0 (-16.4625, 13.2195) -> (-343.5634, 13.2195)
  line L1 (-343.5634, 13.2195) -> (-343.5634, 5.8328)
  line L2 (-343.5634, 5.8328) -> (-16.4625, 5.8328)
  line L3 (-16.4625, 5.8328) -> (-16.4625, 13.2195)
  point P0 (0, 0)
extrude "Extrusion9" add sketch "Sketch8" against normal up to surface (0.1 mm away)
sketch "Sketch9" plane through (0, 0, -3) normal (0, 0, -1) x (-1, 0, 0)
  circle A0 centre (63, 9.525) radius 1.5 projected
  circle A1 centre (63, 9.525) radius 2.55
  circle A2 centre (298.95, 9.525) radius 2.5 projected
  circle A3 centre (298.95, 9.525) radius 2.55
  point P0 (0, 0)
  dimension "d42" = 5.1
  dimension "d43" = 5.1
extrude "Extrusion10" cut sketch "Sketch9" against normal up to surface (1 mm away) contours A1 | A2
properties part number "2021-01-007" material "Aluminum 6061"
